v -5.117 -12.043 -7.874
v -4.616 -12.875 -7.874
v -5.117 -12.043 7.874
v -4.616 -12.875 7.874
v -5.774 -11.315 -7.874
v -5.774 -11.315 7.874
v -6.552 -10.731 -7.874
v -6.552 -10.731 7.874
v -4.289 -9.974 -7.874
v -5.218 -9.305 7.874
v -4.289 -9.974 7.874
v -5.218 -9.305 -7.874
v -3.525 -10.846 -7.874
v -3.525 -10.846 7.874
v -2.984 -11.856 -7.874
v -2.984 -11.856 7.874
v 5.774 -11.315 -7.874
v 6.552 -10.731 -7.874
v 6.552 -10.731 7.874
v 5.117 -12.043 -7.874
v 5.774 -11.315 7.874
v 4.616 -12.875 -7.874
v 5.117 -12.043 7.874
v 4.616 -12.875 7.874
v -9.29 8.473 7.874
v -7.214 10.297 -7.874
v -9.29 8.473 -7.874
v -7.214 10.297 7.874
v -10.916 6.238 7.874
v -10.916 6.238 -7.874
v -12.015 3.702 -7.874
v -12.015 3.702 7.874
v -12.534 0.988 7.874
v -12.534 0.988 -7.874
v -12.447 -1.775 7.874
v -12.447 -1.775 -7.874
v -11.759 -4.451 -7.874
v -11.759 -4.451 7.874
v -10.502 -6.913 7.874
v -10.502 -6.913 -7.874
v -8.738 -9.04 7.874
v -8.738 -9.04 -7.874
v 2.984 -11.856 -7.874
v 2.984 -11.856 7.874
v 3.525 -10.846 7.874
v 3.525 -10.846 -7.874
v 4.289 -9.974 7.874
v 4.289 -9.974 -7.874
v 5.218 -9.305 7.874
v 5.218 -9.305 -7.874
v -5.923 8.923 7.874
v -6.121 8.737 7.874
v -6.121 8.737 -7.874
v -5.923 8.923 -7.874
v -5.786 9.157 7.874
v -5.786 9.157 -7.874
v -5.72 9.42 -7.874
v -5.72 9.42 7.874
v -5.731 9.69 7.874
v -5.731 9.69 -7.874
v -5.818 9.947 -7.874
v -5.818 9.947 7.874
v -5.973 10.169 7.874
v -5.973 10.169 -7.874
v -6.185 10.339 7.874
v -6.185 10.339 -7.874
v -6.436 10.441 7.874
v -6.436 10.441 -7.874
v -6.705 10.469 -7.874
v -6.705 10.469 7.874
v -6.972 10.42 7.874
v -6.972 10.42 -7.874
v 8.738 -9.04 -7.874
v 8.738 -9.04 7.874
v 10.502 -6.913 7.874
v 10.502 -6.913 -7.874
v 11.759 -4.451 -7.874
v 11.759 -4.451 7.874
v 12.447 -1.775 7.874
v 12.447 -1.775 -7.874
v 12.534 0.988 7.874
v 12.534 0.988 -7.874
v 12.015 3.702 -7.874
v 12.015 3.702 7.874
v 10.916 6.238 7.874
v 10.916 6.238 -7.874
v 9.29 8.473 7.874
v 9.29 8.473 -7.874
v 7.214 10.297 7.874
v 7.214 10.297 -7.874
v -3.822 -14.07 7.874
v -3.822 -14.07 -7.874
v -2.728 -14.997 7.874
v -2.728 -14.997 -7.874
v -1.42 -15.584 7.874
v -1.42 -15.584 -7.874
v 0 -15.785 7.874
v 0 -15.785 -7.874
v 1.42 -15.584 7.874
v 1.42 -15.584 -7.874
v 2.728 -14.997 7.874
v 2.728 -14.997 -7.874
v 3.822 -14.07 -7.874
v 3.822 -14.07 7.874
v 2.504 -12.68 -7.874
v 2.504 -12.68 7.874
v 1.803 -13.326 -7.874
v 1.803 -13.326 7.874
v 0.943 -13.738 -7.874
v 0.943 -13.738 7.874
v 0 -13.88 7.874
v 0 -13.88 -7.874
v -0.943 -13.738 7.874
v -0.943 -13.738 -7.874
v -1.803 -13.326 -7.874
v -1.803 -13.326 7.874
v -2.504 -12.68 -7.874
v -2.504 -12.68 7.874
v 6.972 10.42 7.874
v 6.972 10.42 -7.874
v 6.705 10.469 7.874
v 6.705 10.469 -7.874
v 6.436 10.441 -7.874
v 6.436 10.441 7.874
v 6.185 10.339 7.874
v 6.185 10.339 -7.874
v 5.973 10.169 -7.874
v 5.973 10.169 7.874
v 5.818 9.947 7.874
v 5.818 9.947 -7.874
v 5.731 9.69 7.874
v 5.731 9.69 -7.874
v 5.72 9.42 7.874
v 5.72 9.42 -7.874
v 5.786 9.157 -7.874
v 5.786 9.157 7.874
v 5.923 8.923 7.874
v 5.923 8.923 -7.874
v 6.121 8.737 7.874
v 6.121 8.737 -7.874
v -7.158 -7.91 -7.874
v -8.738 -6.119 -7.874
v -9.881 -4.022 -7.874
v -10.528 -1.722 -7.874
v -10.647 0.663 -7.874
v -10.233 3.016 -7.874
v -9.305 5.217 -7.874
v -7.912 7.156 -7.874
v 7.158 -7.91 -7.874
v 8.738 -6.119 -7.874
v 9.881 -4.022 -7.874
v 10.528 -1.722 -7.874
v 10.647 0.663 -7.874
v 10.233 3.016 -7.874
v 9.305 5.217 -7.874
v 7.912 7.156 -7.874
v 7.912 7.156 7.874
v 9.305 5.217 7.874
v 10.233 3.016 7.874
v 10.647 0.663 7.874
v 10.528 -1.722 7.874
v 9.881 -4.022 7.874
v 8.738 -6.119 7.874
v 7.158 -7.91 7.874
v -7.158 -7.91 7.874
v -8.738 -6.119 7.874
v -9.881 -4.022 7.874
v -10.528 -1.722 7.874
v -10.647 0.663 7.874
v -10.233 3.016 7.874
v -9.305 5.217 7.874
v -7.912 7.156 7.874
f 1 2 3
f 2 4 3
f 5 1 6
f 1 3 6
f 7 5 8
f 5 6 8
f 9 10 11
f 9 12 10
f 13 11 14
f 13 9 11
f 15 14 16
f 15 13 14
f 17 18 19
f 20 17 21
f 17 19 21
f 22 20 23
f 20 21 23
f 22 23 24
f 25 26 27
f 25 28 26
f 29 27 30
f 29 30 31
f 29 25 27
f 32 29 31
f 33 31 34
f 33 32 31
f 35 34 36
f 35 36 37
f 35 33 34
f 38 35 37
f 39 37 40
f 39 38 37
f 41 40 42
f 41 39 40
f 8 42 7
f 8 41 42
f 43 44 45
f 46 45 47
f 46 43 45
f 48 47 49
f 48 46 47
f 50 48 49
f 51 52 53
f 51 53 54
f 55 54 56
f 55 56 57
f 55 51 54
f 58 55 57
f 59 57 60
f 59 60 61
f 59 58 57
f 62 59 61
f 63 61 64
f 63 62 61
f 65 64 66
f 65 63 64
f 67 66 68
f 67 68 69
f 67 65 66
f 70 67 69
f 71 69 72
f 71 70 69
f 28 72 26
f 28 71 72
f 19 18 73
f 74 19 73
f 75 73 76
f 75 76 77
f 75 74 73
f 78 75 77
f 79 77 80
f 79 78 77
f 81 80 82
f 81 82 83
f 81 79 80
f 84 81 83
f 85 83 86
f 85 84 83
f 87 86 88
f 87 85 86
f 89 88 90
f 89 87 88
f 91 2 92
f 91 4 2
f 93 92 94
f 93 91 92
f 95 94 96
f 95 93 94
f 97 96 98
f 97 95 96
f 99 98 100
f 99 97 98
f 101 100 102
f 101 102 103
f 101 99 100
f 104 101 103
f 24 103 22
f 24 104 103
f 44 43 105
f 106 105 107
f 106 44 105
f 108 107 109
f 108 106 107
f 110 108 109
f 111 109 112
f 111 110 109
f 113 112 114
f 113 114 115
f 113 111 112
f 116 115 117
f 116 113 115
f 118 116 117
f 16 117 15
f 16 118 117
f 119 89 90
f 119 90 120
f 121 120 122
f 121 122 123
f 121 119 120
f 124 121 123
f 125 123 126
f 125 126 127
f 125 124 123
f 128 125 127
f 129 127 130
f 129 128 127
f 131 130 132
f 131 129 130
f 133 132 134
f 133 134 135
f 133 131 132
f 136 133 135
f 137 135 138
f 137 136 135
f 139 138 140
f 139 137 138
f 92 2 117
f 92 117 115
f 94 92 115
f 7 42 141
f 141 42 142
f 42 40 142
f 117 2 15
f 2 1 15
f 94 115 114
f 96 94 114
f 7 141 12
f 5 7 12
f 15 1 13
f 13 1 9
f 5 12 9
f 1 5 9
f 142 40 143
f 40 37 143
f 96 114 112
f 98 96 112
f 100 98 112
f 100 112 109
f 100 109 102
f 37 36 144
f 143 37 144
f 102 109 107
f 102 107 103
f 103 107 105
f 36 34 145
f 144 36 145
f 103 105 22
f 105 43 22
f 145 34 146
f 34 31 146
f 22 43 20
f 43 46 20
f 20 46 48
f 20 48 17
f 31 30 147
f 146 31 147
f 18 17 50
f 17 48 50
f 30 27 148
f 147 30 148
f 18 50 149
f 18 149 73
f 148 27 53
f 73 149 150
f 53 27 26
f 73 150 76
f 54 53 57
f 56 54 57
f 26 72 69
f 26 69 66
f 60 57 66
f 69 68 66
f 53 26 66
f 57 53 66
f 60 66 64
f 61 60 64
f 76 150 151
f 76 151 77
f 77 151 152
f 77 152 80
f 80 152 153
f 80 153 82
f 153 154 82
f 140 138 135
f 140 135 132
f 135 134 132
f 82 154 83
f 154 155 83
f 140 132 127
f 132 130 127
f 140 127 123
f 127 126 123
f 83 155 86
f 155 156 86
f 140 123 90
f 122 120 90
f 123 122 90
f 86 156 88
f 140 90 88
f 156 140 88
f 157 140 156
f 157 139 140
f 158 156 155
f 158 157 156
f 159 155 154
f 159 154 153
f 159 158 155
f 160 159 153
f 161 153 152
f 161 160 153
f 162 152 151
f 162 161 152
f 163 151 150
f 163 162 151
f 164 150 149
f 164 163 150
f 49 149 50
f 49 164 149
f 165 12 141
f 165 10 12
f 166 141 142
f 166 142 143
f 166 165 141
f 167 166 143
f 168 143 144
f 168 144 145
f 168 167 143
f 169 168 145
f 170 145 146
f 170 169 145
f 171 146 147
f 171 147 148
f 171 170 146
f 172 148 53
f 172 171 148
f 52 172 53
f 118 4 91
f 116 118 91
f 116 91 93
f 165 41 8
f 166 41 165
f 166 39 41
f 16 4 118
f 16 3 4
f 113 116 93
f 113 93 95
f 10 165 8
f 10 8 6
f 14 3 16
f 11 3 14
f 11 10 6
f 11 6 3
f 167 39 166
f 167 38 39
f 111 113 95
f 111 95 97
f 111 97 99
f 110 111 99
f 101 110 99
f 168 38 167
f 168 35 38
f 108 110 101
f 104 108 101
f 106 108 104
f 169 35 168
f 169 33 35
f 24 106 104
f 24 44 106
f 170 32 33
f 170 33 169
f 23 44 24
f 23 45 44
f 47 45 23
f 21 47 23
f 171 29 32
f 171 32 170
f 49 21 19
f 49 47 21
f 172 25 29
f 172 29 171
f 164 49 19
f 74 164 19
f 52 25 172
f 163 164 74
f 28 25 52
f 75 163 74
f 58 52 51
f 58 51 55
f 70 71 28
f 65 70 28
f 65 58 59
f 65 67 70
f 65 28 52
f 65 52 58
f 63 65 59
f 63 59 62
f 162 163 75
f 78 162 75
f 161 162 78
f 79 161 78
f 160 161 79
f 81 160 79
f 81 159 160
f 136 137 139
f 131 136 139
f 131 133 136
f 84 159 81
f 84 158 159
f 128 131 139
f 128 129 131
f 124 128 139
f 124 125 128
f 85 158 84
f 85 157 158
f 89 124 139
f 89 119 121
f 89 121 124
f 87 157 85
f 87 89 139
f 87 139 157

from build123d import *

# Parameters (mm, degrees)
F1_DEPTH = 7.874
F2_R     = 5.08


# Not quite as in the source:
# - a feature names something its author has since deleted; it is built from what else it names


with BuildPart() as f1:
    # F0 (on Top) → F1 (new body, symmetric)
    with BuildSketch(Plane.XY):
        with BuildLine():
            ThreePointArc((-3.175, -10.1845765253), (-10.541007581, -1.6411530025), (-6.1209836066, 8.7372640848))
            ThreePointArc((-6.1209836066, 8.7372640848), (-5.8873871353, 10.063893343), (-7.2140163934, 10.2974898143))
            ThreePointArc((-7.2140163934, 10.2974898143), (-12.5113475889, -1.2435877575), (-5.0458178338, -11.5160779516))
            ThreePointArc((-5.0458178338, -11.5160779516), (0, -15.7845920127), (5.0458178338, -11.5160779516))
            ThreePointArc((5.0458178338, -11.5160779516), (12.5113475889, -1.2435877575), (7.2140163934, 10.2974898143))
            ThreePointArc((7.2140163934, 10.2974898143), (5.8873871353, 10.063893343), (6.1209836066, 8.7372640848))
            ThreePointArc((6.1209836066, 8.7372640848), (10.541007581, -1.6411530025), (3.175, -10.1845765253))
            ThreePointArc((3.175, -10.1845765253), (0, -13.8795920127), (-3.175, -10.1845765253))
        make_face()
    extrude(amount=F1_DEPTH, both=True)

    # F2
    f2_edges = [f1.edges().sort_by_distance(p)[0] for p in [
        (-5.045818, -11.516078, 0),
        (-3.175, -10.184577, 0),
        (3.175, -10.184577, 0),
        (5.045818, -11.516078, 0),
    ]]
    fillet(f2_edges, radius=F2_R)


solid = f1.part
